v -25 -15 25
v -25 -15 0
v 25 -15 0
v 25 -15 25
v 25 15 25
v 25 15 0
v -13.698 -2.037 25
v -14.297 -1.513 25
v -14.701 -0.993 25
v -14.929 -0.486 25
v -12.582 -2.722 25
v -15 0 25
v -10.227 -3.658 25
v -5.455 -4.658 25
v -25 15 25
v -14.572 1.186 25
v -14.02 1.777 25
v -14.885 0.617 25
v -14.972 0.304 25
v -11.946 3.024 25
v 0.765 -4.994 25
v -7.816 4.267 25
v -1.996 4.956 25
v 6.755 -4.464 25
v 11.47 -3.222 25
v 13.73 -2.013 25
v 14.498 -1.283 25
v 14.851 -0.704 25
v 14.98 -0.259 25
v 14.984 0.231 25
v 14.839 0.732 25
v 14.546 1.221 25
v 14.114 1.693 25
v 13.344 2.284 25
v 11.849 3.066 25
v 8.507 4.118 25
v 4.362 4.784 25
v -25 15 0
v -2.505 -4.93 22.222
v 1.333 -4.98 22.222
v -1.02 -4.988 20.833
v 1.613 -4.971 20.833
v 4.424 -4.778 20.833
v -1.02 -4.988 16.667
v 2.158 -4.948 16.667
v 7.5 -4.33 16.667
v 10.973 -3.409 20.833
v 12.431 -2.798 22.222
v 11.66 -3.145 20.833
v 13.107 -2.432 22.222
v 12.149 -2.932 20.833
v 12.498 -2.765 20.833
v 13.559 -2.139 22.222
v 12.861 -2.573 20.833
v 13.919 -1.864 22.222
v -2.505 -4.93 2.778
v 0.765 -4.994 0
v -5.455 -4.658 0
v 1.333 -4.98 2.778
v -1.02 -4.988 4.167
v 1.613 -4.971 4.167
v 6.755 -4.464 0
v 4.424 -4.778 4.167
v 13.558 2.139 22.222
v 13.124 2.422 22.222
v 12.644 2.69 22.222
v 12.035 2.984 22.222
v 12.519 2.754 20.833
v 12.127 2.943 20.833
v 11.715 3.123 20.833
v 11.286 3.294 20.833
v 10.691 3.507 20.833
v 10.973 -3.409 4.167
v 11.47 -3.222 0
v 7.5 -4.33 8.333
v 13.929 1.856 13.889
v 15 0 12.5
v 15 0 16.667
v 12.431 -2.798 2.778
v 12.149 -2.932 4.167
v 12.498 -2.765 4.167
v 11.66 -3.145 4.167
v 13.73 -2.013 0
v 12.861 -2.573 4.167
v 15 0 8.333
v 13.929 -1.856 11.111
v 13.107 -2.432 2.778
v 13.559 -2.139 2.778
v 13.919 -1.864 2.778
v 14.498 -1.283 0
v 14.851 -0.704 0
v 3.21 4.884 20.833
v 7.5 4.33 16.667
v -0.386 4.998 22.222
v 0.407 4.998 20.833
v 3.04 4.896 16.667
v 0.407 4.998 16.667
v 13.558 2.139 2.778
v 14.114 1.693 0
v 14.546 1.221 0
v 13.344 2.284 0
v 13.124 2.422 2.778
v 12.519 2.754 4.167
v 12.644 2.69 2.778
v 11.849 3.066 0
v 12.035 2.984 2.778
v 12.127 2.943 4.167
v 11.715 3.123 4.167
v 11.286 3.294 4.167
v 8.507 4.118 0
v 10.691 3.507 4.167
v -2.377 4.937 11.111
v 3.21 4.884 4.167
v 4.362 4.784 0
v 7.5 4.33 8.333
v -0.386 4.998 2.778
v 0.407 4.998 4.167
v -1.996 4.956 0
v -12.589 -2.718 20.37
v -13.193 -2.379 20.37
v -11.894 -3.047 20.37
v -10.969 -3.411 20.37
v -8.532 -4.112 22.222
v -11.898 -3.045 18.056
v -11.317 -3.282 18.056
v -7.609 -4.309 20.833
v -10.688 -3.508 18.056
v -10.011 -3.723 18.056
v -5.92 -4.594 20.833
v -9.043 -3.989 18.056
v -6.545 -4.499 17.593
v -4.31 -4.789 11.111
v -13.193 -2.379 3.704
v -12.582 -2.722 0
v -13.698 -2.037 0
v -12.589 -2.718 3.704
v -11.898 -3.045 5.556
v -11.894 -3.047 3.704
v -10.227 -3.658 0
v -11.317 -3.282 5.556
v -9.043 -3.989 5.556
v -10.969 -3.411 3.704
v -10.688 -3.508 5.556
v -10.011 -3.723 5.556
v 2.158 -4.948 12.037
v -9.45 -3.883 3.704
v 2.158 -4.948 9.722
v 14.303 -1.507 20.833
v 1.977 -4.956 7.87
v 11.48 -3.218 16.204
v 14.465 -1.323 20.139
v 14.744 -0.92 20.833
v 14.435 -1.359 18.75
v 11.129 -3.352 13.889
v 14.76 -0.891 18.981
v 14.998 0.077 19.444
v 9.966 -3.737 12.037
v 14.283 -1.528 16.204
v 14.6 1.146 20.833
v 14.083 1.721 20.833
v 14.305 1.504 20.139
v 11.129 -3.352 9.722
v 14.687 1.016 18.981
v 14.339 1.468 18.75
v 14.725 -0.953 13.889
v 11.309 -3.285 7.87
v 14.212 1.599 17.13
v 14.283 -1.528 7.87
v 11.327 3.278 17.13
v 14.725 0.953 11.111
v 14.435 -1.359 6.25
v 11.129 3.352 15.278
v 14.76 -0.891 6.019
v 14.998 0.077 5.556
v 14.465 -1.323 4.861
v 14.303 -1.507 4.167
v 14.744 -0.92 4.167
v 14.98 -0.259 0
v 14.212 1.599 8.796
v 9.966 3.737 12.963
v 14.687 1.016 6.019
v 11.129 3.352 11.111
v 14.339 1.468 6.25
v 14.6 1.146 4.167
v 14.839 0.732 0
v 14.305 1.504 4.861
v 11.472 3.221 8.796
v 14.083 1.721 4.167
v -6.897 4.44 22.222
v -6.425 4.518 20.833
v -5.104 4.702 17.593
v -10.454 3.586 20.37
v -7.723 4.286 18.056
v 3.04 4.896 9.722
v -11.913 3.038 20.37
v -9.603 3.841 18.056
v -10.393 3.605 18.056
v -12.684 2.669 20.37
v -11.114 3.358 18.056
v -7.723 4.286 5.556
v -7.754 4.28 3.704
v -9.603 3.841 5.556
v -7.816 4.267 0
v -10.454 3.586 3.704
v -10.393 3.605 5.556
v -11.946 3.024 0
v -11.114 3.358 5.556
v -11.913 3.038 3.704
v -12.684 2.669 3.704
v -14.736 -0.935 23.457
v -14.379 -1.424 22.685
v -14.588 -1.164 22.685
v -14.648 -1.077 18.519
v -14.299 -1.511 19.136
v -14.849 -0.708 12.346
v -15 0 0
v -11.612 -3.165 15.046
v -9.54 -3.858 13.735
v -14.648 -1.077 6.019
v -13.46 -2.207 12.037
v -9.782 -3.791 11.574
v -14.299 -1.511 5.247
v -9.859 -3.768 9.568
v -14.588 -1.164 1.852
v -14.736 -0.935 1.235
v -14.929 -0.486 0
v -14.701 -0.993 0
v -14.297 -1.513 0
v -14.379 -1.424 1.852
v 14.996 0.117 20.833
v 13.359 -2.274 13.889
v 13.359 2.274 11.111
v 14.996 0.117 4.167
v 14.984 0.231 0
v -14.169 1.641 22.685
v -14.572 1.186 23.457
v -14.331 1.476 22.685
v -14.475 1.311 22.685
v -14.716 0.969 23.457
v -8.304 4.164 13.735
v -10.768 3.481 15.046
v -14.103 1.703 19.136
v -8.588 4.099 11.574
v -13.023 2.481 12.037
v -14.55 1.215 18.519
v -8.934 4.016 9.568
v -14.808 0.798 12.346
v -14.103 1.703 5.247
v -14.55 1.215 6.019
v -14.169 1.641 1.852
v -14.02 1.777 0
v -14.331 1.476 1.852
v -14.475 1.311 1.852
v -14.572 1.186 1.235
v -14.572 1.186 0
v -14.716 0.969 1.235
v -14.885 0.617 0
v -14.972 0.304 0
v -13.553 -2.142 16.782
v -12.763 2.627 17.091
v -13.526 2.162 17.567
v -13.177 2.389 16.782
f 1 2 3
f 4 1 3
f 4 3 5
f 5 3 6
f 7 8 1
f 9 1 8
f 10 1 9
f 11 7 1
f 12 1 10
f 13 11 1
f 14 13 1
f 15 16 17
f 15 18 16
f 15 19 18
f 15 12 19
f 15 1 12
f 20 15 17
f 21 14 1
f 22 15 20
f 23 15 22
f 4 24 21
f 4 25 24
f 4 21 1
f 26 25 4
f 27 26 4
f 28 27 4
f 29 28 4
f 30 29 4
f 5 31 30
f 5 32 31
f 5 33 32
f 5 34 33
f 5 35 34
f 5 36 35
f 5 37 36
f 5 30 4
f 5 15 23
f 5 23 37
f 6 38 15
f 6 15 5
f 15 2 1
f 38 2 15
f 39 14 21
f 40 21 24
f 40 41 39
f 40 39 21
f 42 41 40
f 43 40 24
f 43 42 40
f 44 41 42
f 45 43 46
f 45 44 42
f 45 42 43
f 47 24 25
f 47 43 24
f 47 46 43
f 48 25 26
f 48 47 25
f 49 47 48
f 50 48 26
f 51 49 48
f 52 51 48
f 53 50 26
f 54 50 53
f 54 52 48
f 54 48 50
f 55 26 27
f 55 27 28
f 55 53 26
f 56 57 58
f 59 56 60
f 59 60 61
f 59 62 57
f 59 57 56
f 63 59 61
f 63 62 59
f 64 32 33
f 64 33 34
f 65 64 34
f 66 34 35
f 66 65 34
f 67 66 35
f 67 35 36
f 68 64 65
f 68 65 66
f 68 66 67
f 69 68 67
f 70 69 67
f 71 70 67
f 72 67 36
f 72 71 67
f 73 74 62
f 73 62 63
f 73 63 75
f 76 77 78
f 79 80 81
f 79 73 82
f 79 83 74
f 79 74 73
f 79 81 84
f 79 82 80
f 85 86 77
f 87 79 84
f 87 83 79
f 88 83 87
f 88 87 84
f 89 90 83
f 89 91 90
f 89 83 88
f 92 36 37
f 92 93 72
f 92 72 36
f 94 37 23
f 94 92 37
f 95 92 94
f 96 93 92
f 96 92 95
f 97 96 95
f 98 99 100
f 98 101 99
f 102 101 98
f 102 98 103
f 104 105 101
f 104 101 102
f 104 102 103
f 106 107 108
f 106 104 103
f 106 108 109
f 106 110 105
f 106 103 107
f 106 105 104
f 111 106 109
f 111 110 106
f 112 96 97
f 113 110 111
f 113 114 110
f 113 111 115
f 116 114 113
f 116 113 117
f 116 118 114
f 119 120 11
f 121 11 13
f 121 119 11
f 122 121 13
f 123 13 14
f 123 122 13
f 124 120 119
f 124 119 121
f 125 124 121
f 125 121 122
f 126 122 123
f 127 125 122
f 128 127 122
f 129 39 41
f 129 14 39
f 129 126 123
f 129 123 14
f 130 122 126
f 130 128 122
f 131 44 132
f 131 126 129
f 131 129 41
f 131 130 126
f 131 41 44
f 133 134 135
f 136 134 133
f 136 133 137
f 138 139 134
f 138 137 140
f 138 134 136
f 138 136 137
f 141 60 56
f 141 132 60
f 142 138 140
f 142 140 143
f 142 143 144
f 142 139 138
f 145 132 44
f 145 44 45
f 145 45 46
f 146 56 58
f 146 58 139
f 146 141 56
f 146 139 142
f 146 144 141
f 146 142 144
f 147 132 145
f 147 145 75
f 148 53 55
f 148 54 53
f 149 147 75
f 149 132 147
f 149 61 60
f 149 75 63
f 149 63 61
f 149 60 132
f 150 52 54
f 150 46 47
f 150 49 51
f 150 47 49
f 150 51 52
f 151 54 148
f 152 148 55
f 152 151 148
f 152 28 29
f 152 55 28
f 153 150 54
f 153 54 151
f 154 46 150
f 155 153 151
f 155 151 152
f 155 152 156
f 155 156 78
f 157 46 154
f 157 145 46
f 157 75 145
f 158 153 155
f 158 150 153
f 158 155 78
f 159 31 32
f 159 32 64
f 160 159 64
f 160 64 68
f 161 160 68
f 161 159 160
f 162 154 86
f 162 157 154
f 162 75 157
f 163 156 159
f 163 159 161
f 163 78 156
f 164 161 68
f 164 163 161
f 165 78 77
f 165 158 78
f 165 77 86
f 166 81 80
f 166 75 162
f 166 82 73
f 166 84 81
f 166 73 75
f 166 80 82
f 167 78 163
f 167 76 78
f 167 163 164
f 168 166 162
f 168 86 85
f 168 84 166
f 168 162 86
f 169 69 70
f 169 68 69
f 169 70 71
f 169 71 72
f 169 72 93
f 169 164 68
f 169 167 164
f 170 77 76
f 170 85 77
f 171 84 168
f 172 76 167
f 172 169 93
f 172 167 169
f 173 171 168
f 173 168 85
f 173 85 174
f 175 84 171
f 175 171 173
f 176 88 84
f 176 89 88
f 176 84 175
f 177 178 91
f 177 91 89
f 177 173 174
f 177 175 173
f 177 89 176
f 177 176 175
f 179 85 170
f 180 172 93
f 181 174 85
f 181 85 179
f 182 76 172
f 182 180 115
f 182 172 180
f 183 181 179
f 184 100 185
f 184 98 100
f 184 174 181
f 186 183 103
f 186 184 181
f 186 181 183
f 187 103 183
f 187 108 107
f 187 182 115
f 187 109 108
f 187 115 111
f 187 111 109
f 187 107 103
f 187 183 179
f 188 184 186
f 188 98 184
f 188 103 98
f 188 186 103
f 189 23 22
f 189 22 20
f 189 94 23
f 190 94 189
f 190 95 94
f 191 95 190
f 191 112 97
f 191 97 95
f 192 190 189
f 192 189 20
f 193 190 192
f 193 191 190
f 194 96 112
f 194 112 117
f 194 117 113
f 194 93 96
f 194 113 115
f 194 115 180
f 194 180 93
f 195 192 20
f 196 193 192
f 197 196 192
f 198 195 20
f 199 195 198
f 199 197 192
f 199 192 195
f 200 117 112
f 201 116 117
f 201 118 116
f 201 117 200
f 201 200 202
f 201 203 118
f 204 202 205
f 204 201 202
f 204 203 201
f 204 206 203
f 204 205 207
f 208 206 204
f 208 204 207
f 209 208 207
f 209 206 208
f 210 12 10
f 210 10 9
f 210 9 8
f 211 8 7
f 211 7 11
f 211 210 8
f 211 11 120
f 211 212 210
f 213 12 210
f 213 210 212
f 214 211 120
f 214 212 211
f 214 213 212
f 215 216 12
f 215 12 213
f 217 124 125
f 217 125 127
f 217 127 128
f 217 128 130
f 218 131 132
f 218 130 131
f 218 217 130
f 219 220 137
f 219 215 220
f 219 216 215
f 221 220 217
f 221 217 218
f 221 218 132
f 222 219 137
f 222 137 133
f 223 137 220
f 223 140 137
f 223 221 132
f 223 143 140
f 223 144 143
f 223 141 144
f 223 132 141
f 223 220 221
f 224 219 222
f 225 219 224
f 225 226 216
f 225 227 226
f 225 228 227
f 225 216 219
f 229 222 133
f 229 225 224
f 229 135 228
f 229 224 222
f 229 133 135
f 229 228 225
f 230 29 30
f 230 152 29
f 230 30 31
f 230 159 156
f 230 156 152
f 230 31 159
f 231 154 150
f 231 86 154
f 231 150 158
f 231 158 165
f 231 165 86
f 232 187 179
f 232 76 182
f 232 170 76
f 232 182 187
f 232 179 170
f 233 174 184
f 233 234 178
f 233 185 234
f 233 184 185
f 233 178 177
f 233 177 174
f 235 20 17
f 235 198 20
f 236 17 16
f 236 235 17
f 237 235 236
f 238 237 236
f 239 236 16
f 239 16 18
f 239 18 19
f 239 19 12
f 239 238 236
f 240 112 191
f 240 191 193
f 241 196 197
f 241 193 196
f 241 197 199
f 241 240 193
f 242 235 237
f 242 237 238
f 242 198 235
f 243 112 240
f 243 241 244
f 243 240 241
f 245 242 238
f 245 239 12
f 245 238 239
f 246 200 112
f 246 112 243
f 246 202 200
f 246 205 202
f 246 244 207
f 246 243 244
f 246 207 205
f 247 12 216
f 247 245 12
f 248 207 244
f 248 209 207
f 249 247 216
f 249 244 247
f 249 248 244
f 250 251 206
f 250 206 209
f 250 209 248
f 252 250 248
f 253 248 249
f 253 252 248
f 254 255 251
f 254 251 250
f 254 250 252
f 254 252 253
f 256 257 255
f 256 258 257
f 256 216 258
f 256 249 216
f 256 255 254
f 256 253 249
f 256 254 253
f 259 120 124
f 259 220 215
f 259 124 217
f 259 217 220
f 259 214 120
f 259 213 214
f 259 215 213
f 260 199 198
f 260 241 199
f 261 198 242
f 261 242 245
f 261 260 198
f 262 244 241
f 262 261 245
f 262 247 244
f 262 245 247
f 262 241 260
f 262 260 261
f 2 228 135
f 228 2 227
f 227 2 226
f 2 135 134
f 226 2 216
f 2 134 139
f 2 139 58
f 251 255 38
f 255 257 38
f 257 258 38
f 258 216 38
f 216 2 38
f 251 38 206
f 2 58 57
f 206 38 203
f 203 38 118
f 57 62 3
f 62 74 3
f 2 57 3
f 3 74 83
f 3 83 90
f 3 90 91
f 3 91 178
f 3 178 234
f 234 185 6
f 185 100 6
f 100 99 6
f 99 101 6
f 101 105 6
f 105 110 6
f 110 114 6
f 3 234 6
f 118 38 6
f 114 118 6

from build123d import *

# Parameters (mm, degrees)
F0_W     = 50
F0_H     = 30
F1_DEPTH = 25


with BuildPart() as f1:
    # F0 (on Top) → F1 (new body)
    with BuildSketch(Plane.XY):
        Rectangle(F0_W, F0_H)
        with BuildLine():
            add(Edge.make_bspline(
                [(-15, 0), (-15, -8.660254), (7.5, -4.330127), (30, 0), (7.5, 4.330127), (-15, 8.660254), (-15, 0)],
                knots=[0, 0, 0, 2.094395, 2.094395, 4.18879, 4.18879, 6.283185, 6.283185, 6.283185], degree=2, weights=[1, 0.5, 1, 0.5, 1, 0.5, 1]))
        make_face(mode=Mode.SUBTRACT)
    extrude(amount=F1_DEPTH)


solid = f1.part
